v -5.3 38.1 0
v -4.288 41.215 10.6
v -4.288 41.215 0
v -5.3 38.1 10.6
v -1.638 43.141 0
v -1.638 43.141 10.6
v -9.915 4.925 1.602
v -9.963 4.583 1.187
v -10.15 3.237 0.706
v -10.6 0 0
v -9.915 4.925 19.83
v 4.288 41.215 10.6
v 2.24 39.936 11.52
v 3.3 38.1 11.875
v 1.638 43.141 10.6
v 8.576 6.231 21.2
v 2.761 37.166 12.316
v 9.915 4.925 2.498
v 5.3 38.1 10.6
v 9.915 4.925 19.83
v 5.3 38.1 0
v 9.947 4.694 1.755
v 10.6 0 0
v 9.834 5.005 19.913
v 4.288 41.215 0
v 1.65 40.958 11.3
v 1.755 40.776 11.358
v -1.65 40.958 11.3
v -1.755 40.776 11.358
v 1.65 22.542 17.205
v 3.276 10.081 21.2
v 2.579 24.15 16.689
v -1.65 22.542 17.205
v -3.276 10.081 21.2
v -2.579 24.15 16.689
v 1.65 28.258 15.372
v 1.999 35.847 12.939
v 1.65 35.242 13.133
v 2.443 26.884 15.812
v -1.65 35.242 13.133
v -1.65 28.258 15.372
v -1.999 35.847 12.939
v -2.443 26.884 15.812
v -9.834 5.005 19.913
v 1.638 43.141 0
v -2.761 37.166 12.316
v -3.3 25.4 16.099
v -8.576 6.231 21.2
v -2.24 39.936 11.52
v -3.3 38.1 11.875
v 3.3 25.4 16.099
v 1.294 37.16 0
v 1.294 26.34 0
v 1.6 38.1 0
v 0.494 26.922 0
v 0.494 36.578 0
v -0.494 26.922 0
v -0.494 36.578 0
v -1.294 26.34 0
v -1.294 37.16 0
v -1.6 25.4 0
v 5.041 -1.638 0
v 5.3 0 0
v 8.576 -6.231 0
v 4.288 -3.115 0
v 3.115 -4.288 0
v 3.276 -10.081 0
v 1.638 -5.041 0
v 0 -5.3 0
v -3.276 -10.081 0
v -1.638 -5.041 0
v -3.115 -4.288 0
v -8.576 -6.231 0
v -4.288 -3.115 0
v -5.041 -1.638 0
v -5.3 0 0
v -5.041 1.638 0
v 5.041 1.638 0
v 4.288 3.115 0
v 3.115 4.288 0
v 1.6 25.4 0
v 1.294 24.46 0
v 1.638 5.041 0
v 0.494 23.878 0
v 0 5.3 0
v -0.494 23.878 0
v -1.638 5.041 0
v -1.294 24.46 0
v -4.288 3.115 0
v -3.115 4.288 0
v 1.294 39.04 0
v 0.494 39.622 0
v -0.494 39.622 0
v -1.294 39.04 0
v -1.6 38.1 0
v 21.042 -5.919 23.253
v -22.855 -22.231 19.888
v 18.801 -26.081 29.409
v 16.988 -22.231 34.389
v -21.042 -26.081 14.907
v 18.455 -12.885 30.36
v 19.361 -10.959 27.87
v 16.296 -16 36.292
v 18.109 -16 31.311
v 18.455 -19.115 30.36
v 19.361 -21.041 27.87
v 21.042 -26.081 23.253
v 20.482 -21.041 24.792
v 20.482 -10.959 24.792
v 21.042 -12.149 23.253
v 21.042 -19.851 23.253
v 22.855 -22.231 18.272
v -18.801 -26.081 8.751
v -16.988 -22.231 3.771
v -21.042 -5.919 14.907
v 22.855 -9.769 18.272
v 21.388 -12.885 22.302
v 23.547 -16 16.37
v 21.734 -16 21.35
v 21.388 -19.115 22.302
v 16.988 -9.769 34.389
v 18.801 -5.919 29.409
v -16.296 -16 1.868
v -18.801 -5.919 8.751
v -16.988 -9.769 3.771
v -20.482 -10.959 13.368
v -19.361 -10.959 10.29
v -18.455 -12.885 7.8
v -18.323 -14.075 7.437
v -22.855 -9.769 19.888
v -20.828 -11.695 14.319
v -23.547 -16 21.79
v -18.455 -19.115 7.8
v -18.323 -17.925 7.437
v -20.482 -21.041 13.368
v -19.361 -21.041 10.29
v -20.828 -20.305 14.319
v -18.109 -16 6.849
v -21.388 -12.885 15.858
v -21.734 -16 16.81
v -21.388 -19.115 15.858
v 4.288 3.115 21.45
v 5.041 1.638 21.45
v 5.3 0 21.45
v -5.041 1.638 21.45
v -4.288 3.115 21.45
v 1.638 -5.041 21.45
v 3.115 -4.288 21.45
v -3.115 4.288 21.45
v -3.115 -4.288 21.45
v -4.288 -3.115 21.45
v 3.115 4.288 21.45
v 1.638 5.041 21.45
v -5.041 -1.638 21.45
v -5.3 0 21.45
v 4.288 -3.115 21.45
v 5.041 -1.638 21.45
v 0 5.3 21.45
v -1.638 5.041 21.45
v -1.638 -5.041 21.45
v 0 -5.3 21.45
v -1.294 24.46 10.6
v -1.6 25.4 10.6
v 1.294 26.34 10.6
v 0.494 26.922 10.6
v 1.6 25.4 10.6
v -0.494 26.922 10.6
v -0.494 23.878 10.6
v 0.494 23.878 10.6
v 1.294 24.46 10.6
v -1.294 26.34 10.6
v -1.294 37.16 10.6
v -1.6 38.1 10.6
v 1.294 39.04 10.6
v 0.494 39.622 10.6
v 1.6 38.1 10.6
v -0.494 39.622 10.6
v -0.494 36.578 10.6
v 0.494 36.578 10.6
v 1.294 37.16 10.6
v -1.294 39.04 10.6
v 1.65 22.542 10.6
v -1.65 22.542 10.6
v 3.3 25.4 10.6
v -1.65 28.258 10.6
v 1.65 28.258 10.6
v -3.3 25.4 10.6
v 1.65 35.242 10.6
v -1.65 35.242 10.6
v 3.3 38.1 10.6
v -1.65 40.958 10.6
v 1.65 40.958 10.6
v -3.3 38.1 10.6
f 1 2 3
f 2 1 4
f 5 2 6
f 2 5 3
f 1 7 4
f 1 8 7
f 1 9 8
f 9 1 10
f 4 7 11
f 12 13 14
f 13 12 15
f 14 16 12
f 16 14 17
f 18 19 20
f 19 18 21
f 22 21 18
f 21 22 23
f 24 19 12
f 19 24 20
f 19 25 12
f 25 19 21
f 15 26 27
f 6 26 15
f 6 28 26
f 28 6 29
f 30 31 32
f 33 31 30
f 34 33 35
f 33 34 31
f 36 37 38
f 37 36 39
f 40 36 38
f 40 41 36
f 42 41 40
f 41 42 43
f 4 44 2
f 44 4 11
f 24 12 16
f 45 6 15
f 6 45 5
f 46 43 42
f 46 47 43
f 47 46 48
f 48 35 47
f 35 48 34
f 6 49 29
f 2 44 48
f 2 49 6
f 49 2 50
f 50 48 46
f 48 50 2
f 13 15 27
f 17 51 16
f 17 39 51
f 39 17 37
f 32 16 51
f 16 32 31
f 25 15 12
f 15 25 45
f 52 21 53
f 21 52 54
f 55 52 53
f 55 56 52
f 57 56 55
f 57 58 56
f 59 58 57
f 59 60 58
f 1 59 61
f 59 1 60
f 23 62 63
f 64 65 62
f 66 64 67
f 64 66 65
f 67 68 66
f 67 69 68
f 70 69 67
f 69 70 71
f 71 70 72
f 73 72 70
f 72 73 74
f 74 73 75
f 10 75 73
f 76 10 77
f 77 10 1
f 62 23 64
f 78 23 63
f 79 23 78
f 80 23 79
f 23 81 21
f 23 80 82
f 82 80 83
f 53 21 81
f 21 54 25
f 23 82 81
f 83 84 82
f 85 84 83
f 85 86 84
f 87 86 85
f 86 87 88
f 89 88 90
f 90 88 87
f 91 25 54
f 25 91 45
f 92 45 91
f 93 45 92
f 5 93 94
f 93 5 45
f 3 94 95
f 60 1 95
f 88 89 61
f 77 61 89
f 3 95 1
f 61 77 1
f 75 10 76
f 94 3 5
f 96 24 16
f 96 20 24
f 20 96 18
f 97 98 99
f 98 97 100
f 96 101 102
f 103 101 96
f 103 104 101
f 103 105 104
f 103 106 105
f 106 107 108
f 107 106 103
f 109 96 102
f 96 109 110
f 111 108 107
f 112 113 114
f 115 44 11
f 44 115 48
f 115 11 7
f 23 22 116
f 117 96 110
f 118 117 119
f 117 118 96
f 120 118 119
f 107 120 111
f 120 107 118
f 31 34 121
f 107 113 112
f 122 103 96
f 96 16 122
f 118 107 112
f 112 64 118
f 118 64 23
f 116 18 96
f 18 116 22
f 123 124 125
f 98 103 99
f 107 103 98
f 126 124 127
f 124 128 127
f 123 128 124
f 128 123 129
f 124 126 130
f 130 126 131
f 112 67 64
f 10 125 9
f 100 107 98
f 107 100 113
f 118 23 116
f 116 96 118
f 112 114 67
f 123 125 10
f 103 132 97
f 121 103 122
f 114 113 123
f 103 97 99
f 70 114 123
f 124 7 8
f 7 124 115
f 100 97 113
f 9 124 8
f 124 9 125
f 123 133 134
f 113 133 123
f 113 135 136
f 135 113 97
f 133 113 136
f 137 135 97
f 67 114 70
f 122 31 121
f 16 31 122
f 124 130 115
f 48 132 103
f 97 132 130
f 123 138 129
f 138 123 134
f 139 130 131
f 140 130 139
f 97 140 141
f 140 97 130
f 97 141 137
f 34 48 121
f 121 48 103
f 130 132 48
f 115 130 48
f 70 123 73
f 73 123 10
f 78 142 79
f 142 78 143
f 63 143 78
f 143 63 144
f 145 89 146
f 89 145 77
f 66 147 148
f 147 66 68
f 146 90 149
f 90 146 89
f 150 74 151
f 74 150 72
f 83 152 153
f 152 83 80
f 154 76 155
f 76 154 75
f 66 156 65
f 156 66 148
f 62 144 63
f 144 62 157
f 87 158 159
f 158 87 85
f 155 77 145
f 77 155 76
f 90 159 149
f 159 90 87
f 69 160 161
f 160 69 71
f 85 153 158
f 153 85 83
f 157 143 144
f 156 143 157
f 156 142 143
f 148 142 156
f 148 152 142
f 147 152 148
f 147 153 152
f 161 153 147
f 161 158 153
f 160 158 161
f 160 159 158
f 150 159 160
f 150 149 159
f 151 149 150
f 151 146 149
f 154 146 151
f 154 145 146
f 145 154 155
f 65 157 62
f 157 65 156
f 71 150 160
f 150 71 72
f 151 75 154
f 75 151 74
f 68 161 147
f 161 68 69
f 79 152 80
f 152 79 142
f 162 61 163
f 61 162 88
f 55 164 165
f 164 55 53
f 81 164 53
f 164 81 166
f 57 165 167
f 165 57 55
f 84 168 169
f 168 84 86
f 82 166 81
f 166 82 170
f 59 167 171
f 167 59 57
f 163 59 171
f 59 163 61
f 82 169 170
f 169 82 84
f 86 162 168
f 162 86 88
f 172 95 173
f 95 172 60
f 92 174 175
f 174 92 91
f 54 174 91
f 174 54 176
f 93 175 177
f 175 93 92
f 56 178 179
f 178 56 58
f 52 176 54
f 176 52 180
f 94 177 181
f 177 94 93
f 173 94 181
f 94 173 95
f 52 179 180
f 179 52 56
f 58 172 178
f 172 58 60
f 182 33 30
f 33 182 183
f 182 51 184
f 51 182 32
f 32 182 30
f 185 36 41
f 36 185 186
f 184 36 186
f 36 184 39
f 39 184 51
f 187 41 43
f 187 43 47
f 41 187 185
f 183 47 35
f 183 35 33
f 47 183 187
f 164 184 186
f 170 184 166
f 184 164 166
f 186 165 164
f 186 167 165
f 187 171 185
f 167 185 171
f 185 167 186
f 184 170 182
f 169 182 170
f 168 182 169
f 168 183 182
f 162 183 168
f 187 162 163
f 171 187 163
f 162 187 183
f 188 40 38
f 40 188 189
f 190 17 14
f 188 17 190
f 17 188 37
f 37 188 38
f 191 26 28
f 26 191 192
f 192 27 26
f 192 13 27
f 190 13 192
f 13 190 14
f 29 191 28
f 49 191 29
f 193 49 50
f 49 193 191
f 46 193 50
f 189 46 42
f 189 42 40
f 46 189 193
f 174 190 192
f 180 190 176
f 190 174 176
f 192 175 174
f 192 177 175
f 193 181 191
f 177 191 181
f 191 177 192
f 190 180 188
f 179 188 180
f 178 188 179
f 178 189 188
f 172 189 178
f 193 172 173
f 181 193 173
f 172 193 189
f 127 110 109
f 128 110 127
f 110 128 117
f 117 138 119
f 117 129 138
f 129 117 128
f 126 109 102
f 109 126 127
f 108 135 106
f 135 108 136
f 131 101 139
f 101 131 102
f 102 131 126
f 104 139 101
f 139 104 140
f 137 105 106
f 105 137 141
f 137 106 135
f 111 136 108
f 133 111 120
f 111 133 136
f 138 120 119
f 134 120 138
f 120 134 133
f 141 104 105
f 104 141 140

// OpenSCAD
// file: ../Parameters.scad
//Main tube diameter - hole [mm]
main_tube_outer_diameter = 25.4;
main_tube_inner_diameter = 23.1;

//Tube for undercarriage - rendered hole [mm]
tube_for_undercarriage_outer_diameter = 10.6;
tube_for_undercarriage_inner_diameter = 6;
global_clearance = 0.5;

// Nastavení parametrů rotoru

rotor_blade_AOA = 1.5;      // nastavení úhlu náběhu rotorového listu
rotor_blade_length = 970;   // délka rotorového listu
rator_blade_depth = 50;     // hloubka rotorového listu


// Parameters of tube couplings
coupling_wall_thickness = main_tube_outer_diameter/5;  //width of coupling walls 
thickness_between_tubes = main_tube_outer_diameter/10;    // minimum distance between tubes in couplings

coupling_wall_thickness_undercarriage = tube_for_undercarriage_outer_diameter/3;
thickness_between_tubes_undercarriage = tube_for_undercarriage_outer_diameter/10;

608_bearing_outer_diameter = 22;
608_bearing_thickness = 7.1;


// screw length step - minimum difference in length between two types of screws
basic_screw_length = 5;


//Screw diameter and nut for M6 [mm]
M6_screw_diameter=6.5;
Nut_height_M6 = 4.9;
Nut_diameter_M6 = 11.8;


//Screw diameter and nut for M4 [mm]
M4_screw_diameter=4.5;
Nut_height_M4 = 3.2;
Nut_diameter_M4 = 8.4;
Screw_head_height_M4 = 4;

//Screw diameter and nut for M3 [mm]
M3_screw_diameter = 3.2;
Nut_height_M3 = 2.7;	
Nut_diameter_M3 = 6.6; 
Screw_head_height_M3 = 3;


//šroub servo
Servo_screw = 1.5;

//The tube for help
Help_main_tube_outer = 25;
Help_main_tube_inner = 23; 
Help_tube_for_undercarriage_outer = 10;
Help_tube_for_undercarriage_inner = 5;


//main hull parameters

hull_drop_length = 580;
hull_wall_thickness = 0.8;
hull_y_size = 120;
hull_z_size = 150;
hull_x_size = 580;
hull_corner_radius = 4;
hull_airfoil_thickness= 35;  // thickness of drop generating airfoil in percent of length.
hull_scale_x = 1;
hull_scale_y = 1.5;
hull_scale_z = 1.5;

main_pilon_position = 170+68+30;       // pozice rotorového pilonu měřená od přední části krytu
cover_pilon_position = 180;
height_of_vertical_tube = 275; //278mm je změřená délka trubky. 

//délka hlavní dlouhé trubky
length_of_main_tube = 820;
length_of_undercarriage_tube = 300;

ribbon_width = 5; // šířka vyztužovacích lemů. 

// šířka otvoru v přední části kapoty pro držák motoru.
width_of_engine_holder = 63;

//Top Cover Division - dělení horního krytu pro tisk
top_cover_division = [0, 50, 150, 280, 410, hull_x_size]; // upraveny seznam tak, aby deleni začinalo od nuly, což umožňí úplně automatické rozdělení.

//Bottom Cover Division - dělení dolního krytu pro tisk
bottom_cover_division = [0,100,232.5,365, 470, hull_x_size];
// zkrácená část pro payload pro testovací tisk
//bottom_cover_division = [0,200,250,365, 470, hull_x_size];





//Cover pilon division - na výšku (v ose Z)
cover_pilon_division = [0,170,height_of_vertical_tube + main_tube_outer_diameter + coupling_wall_thickness];

//pozice šroubů
	//horní kryt
top_screw_position = [0,
                    (top_cover_division[0] + top_cover_division[1])/2,
                    (top_cover_division[2] - top_cover_division[1])/2 + top_cover_division[1],
                    (top_cover_division[3] - top_cover_division[2])/2 + top_cover_division[2],
                    (top_cover_division[4] - top_cover_division[3])/8 + top_cover_division[3],
                    (top_cover_division[5] - top_cover_division[4])/2 + top_cover_division[4] - top_cover_division[1]/3];
	//spodní kryt
bottom_screw_position = [0,
                        (bottom_cover_division[0] + bottom_cover_division[1])*(2/6), 
                        bottom_cover_division[1]*(9/10), 
                        bottom_cover_division[3] + bottom_cover_division[1]*(1/10), 
                        bottom_cover_division[3] + bottom_cover_division[1]*(3/5)];




//šířka zámků
lock_width = 10;

//délka zámků
lock_length = 3;


//accumulator
//základní rozměry akumulátoru
width_of_accumulator = 129.4;//45+1;
depth_of_accumulator = 40.61;
height_of_accumulator = 43.65;
//Zapuštění akumulátoru
sink_of_accumulator = 5; //main_tube_outer_diameter/5 - Nut_height_M3*1.5;

//tloušťka hrany spojky
accumulator_holder_width = 18; 
accumulator_holder_thickness = 10; 

//posunutí akumálátoru na podložce
move_of_accumulator = 75;   // pozice akumulátoru (ovlivňuje těžiště)


////////////////
// Senzory
///////////////////

//opticalFlow
width_optical_flow_senzor = 45.5;
depth_optical_flow_senzor = 6;
height_optical_flow_senzor = 35;
sink_of_optical_flow_senzor = depth_optical_flow_senzor - 5; 
M3_optical_flow_senzor_Z = 30.4;
M3_optical_flow_senzor_X = 24;
M3_optical_flow_senzor_Z_alone = 9.1;
M3_optical_flow_senzor_X_alone = 16.7;

//GPS anténa
GPS_outer_length = 48.01;   //Vnější rozměr
GPS_inner_length = 37.48;   //Vnitřní rozměr
GPS_diameter = (GPS_outer_length - GPS_inner_length)/2;    //Průměr otvoru
GPS_middle_length = GPS_diameter + GPS_inner_length;      //Střední rozměr


////podzvozek

radius_undercarriage = 25;
vzdalenost_x = tan(20) * 131;
vzdalenost_y = (131 - radius_undercarriage)/tan(79);
uhel_y = 90 - 20;
uhel_x = 90 - 79;

maximum_printable_size = 150;


////Pitotova trubice
Pitot_tube_diameter = 4.02 + 1;
Distance_hole_from_tube = 11.92;  //vzdálenost otvoru pro připevnění od samotné trubičky


////směrové kormidlo
Rudder_length = 4*main_tube_outer_diameter;
Rudder_height = 2*main_tube_outer_diameter;
Rudder_depth = main_tube_outer_diameter/2;
gap_width = 2*hull_wall_thickness;      //šířka mezery mezi směrovkou a ocasní plochou
ruder_shaft_diameter = 2.6; //otočné uchycení směrovky - průměr 2 mm


/////spojka 666_1004

    width_666_1004 = (main_tube_outer_diameter+2*coupling_wall_thickness - Screw_head_height_M3)/basic_screw_length;
        echo("width_666_1004 is", width_666_1004);
    
        echo("ceil_666_1004 is", ceil(width_666_1004));

    coupling_screw_length_666_1004 = (ceil(width_666_1004)) * basic_screw_length;
        echo("coupling_screw_length_666_1004 is", coupling_screw_length_666_1004);

    coupling_width_666_1004 = coupling_screw_length_666_1004 + Screw_head_height_M3;
        echo("coupling_width_666_1004 is", coupling_width_666_1004);

    height_666_1004 = coupling_width_666_1004;
        echo("height_666_1004 is", height_666_1004);

    depth_666_1004 = main_tube_outer_diameter*2+2*coupling_wall_thickness+thickness_between_tubes;
        echo("depth_666_1004 is", depth_666_1004);

    depth_666_1004_drillhelper = main_tube_outer_diameter*3;

/////spojka 666_1026



    width_666_1026 = main_tube_outer_diameter + 2*thickness_between_tubes;
    
    depth_666_1026 = (main_tube_outer_diameter*2)/basic_screw_length;
        echo("depth_666_1026 is", depth_666_1026);
    
        echo("ceil_666_1026 is", ceil(depth_666_1026));

    coupling_screw_length_666_1026 = (ceil(depth_666_1026)) * basic_screw_length;
        echo("coupling_screw_length_666_1026 is", coupling_screw_length_666_1026);


thickness_of_plate = coupling_screw_length_666_1026 - Screw_head_height_M4 - 50; //50 mm je konstatní šířka spojky 666_1026
    echo("thickness_of_plate is", thickness_of_plate);

        coupling_depth_666_1026 = coupling_screw_length_666_1026 - Screw_head_height_M4 - thickness_of_plate;      //zde je odečten screw_head_height_M4 pro určení šířky, tak aby šroub přesahoval pro potřebnou matku
            echo("coupling_depth_666_1026 is", coupling_depth_666_1026);

    height_666_1026 = 2*main_tube_outer_diameter;
        echo("height_666_1026 is", height_666_1026);

//tloušťka plechu pro zajištění konstatní šířky spojky 50 mm

    width_666_1026_drillhelper = main_tube_outer_diameter*2; 

    depth_666_1026_drillhelper = main_tube_outer_diameter + 4*thickness_between_tubes;


////spojka 666_1017

    width_666_1017 = (main_tube_outer_diameter + 4*coupling_wall_thickness - Screw_head_height_M3)/basic_screw_length;
        echo("width_666_1017 is", width_666_1017);
    
        echo("ceil_666_1017 is", ceil(width_666_1017));

    coupling_screw_length_666_1017 = (ceil(width_666_1017)) * basic_screw_length;
        echo("coupling_screw_length_666_1017 is", coupling_screw_length_666_1017);

    coupling_width_666_1017 = coupling_screw_length_666_1017 + Screw_head_height_M3;
        echo("coupling_width_666_1017 is", coupling_width_666_1017);

    depth_666_1017 = coupling_width_666_1017;

    height_666_1017= 70; //main_tube_outer_diameter*1.8+main_tube_outer_diameter+wall_thickness;

    width_666_1017_drillhelper = main_tube_outer_diameter+4*thickness_between_tubes;
    
    depth_666_1017_drillhelper = main_tube_outer_diameter*2;


////spojka 666_1014

    width_666_1014 = tube_for_undercarriage_outer_diameter + 2*coupling_wall_thickness_undercarriage;

    depth_666_1014 = tube_for_undercarriage_outer_diameter + M3_screw_diameter + 2*coupling_wall_thickness_undercarriage + thickness_between_tubes_undercarriage;

    height_666_1014 = width_666_1014;


    width_666_1014_drillhelper = 2*tube_for_undercarriage_outer_diameter + 2*coupling_wall_thickness_undercarriage;






//umístění podvozkových trubek

second_undercarriage_hole =height_666_1026 + height_666_1004/2 + 170 + 160;


//Base Divison - dělení podložky
base_division = [0, 159, main_pilon_position + coupling_width_666_1017/2 + global_clearance/2, second_undercarriage_hole + coupling_width_666_1004/2 + global_clearance/2, hull_x_size];

// šrouby pro připevnění podložky k hlavní trubce
base_mounting_screw_length = 50;
// main file
//improving rendering speed.
draft = true;   // sets rendering quality to draft.
$fs = draft ? 5 : 0.5;
$fa = 10;



module 888_2002(draft){

width = 2*tube_for_undercarriage_outer_diameter;
depth = tube_for_undercarriage_outer_diameter + M3_screw_diameter + 2*coupling_wall_thickness_undercarriage + thickness_between_tubes_undercarriage;
height = width;
    
difference(){

    union() {

        hull() {
            cylinder(h = height, r = tube_for_undercarriage_outer_diameter, $fn = draft ? 10 :50 );
            translate([0,1.5*main_tube_outer_diameter,0])
                cylinder(h = height/2, d = tube_for_undercarriage_outer_diameter, $fn = draft ? 10 :50 );
        }

        hull() {
            cylinder(h = height, r = tube_for_undercarriage_outer_diameter, $fn = draft ? 10 :50 );
            translate([0, -32/2 , 1.8 * tube_for_undercarriage_outer_diameter])
                rotate([0,70,0])
                    cylinder(h = 2 * height, r = tube_for_undercarriage_outer_diameter, center = true,  $fn = draft ? 10 :50 );
        }
    }

	//tube
    translate ([0,0,- global_clearance/2])
        cylinder(h = height + global_clearance,d = tube_for_undercarriage_outer_diameter, $fn = draft ? 20 : 50);


    //screw
    translate([0,main_tube_outer_diameter,0])
        cylinder(h = height, r = M3_screw_diameter/2, $fn = draft ? 10 :20 );

    translate([0,1.5*main_tube_outer_diameter,0])
        cylinder(h = height, r = M3_screw_diameter/2, $fn = draft ? 10 :20 );


	//nut
    translate([0, main_tube_outer_diameter, height/2])
        cylinder (h = height, r = Nut_diameter_M3/2, $fn = 6);

    translate([0, 1.5* main_tube_outer_diameter, height/2])
        cylinder (h = height, r = Nut_diameter_M3/2, $fn = 6);

    translate([0, -32/2 , 1.8 * tube_for_undercarriage_outer_diameter])
        rotate([0,70,0])
            cylinder(h = 2.5 * height, d = tube_for_undercarriage_outer_diameter, center = true,  $fn = draft ? 10 :50 );

    %translate([0, -32/2 , 1.8 * tube_for_undercarriage_outer_diameter])
        rotate([0,70-90,0])
          cylinder (h = 50+ Nut_height_M3 + global_clearance, r = Nut_diameter_M3/2, $fn = 6);
    
    %translate([width/2 - Nut_height_M3, 0, height/2])
       rotate([0,90,0])
           cylinder (h = Nut_height_M3 + global_clearance, r = Nut_diameter_M3/2, $fn = 6);

    }
}



888_2002(draft);

include <../Parameters.scad>
